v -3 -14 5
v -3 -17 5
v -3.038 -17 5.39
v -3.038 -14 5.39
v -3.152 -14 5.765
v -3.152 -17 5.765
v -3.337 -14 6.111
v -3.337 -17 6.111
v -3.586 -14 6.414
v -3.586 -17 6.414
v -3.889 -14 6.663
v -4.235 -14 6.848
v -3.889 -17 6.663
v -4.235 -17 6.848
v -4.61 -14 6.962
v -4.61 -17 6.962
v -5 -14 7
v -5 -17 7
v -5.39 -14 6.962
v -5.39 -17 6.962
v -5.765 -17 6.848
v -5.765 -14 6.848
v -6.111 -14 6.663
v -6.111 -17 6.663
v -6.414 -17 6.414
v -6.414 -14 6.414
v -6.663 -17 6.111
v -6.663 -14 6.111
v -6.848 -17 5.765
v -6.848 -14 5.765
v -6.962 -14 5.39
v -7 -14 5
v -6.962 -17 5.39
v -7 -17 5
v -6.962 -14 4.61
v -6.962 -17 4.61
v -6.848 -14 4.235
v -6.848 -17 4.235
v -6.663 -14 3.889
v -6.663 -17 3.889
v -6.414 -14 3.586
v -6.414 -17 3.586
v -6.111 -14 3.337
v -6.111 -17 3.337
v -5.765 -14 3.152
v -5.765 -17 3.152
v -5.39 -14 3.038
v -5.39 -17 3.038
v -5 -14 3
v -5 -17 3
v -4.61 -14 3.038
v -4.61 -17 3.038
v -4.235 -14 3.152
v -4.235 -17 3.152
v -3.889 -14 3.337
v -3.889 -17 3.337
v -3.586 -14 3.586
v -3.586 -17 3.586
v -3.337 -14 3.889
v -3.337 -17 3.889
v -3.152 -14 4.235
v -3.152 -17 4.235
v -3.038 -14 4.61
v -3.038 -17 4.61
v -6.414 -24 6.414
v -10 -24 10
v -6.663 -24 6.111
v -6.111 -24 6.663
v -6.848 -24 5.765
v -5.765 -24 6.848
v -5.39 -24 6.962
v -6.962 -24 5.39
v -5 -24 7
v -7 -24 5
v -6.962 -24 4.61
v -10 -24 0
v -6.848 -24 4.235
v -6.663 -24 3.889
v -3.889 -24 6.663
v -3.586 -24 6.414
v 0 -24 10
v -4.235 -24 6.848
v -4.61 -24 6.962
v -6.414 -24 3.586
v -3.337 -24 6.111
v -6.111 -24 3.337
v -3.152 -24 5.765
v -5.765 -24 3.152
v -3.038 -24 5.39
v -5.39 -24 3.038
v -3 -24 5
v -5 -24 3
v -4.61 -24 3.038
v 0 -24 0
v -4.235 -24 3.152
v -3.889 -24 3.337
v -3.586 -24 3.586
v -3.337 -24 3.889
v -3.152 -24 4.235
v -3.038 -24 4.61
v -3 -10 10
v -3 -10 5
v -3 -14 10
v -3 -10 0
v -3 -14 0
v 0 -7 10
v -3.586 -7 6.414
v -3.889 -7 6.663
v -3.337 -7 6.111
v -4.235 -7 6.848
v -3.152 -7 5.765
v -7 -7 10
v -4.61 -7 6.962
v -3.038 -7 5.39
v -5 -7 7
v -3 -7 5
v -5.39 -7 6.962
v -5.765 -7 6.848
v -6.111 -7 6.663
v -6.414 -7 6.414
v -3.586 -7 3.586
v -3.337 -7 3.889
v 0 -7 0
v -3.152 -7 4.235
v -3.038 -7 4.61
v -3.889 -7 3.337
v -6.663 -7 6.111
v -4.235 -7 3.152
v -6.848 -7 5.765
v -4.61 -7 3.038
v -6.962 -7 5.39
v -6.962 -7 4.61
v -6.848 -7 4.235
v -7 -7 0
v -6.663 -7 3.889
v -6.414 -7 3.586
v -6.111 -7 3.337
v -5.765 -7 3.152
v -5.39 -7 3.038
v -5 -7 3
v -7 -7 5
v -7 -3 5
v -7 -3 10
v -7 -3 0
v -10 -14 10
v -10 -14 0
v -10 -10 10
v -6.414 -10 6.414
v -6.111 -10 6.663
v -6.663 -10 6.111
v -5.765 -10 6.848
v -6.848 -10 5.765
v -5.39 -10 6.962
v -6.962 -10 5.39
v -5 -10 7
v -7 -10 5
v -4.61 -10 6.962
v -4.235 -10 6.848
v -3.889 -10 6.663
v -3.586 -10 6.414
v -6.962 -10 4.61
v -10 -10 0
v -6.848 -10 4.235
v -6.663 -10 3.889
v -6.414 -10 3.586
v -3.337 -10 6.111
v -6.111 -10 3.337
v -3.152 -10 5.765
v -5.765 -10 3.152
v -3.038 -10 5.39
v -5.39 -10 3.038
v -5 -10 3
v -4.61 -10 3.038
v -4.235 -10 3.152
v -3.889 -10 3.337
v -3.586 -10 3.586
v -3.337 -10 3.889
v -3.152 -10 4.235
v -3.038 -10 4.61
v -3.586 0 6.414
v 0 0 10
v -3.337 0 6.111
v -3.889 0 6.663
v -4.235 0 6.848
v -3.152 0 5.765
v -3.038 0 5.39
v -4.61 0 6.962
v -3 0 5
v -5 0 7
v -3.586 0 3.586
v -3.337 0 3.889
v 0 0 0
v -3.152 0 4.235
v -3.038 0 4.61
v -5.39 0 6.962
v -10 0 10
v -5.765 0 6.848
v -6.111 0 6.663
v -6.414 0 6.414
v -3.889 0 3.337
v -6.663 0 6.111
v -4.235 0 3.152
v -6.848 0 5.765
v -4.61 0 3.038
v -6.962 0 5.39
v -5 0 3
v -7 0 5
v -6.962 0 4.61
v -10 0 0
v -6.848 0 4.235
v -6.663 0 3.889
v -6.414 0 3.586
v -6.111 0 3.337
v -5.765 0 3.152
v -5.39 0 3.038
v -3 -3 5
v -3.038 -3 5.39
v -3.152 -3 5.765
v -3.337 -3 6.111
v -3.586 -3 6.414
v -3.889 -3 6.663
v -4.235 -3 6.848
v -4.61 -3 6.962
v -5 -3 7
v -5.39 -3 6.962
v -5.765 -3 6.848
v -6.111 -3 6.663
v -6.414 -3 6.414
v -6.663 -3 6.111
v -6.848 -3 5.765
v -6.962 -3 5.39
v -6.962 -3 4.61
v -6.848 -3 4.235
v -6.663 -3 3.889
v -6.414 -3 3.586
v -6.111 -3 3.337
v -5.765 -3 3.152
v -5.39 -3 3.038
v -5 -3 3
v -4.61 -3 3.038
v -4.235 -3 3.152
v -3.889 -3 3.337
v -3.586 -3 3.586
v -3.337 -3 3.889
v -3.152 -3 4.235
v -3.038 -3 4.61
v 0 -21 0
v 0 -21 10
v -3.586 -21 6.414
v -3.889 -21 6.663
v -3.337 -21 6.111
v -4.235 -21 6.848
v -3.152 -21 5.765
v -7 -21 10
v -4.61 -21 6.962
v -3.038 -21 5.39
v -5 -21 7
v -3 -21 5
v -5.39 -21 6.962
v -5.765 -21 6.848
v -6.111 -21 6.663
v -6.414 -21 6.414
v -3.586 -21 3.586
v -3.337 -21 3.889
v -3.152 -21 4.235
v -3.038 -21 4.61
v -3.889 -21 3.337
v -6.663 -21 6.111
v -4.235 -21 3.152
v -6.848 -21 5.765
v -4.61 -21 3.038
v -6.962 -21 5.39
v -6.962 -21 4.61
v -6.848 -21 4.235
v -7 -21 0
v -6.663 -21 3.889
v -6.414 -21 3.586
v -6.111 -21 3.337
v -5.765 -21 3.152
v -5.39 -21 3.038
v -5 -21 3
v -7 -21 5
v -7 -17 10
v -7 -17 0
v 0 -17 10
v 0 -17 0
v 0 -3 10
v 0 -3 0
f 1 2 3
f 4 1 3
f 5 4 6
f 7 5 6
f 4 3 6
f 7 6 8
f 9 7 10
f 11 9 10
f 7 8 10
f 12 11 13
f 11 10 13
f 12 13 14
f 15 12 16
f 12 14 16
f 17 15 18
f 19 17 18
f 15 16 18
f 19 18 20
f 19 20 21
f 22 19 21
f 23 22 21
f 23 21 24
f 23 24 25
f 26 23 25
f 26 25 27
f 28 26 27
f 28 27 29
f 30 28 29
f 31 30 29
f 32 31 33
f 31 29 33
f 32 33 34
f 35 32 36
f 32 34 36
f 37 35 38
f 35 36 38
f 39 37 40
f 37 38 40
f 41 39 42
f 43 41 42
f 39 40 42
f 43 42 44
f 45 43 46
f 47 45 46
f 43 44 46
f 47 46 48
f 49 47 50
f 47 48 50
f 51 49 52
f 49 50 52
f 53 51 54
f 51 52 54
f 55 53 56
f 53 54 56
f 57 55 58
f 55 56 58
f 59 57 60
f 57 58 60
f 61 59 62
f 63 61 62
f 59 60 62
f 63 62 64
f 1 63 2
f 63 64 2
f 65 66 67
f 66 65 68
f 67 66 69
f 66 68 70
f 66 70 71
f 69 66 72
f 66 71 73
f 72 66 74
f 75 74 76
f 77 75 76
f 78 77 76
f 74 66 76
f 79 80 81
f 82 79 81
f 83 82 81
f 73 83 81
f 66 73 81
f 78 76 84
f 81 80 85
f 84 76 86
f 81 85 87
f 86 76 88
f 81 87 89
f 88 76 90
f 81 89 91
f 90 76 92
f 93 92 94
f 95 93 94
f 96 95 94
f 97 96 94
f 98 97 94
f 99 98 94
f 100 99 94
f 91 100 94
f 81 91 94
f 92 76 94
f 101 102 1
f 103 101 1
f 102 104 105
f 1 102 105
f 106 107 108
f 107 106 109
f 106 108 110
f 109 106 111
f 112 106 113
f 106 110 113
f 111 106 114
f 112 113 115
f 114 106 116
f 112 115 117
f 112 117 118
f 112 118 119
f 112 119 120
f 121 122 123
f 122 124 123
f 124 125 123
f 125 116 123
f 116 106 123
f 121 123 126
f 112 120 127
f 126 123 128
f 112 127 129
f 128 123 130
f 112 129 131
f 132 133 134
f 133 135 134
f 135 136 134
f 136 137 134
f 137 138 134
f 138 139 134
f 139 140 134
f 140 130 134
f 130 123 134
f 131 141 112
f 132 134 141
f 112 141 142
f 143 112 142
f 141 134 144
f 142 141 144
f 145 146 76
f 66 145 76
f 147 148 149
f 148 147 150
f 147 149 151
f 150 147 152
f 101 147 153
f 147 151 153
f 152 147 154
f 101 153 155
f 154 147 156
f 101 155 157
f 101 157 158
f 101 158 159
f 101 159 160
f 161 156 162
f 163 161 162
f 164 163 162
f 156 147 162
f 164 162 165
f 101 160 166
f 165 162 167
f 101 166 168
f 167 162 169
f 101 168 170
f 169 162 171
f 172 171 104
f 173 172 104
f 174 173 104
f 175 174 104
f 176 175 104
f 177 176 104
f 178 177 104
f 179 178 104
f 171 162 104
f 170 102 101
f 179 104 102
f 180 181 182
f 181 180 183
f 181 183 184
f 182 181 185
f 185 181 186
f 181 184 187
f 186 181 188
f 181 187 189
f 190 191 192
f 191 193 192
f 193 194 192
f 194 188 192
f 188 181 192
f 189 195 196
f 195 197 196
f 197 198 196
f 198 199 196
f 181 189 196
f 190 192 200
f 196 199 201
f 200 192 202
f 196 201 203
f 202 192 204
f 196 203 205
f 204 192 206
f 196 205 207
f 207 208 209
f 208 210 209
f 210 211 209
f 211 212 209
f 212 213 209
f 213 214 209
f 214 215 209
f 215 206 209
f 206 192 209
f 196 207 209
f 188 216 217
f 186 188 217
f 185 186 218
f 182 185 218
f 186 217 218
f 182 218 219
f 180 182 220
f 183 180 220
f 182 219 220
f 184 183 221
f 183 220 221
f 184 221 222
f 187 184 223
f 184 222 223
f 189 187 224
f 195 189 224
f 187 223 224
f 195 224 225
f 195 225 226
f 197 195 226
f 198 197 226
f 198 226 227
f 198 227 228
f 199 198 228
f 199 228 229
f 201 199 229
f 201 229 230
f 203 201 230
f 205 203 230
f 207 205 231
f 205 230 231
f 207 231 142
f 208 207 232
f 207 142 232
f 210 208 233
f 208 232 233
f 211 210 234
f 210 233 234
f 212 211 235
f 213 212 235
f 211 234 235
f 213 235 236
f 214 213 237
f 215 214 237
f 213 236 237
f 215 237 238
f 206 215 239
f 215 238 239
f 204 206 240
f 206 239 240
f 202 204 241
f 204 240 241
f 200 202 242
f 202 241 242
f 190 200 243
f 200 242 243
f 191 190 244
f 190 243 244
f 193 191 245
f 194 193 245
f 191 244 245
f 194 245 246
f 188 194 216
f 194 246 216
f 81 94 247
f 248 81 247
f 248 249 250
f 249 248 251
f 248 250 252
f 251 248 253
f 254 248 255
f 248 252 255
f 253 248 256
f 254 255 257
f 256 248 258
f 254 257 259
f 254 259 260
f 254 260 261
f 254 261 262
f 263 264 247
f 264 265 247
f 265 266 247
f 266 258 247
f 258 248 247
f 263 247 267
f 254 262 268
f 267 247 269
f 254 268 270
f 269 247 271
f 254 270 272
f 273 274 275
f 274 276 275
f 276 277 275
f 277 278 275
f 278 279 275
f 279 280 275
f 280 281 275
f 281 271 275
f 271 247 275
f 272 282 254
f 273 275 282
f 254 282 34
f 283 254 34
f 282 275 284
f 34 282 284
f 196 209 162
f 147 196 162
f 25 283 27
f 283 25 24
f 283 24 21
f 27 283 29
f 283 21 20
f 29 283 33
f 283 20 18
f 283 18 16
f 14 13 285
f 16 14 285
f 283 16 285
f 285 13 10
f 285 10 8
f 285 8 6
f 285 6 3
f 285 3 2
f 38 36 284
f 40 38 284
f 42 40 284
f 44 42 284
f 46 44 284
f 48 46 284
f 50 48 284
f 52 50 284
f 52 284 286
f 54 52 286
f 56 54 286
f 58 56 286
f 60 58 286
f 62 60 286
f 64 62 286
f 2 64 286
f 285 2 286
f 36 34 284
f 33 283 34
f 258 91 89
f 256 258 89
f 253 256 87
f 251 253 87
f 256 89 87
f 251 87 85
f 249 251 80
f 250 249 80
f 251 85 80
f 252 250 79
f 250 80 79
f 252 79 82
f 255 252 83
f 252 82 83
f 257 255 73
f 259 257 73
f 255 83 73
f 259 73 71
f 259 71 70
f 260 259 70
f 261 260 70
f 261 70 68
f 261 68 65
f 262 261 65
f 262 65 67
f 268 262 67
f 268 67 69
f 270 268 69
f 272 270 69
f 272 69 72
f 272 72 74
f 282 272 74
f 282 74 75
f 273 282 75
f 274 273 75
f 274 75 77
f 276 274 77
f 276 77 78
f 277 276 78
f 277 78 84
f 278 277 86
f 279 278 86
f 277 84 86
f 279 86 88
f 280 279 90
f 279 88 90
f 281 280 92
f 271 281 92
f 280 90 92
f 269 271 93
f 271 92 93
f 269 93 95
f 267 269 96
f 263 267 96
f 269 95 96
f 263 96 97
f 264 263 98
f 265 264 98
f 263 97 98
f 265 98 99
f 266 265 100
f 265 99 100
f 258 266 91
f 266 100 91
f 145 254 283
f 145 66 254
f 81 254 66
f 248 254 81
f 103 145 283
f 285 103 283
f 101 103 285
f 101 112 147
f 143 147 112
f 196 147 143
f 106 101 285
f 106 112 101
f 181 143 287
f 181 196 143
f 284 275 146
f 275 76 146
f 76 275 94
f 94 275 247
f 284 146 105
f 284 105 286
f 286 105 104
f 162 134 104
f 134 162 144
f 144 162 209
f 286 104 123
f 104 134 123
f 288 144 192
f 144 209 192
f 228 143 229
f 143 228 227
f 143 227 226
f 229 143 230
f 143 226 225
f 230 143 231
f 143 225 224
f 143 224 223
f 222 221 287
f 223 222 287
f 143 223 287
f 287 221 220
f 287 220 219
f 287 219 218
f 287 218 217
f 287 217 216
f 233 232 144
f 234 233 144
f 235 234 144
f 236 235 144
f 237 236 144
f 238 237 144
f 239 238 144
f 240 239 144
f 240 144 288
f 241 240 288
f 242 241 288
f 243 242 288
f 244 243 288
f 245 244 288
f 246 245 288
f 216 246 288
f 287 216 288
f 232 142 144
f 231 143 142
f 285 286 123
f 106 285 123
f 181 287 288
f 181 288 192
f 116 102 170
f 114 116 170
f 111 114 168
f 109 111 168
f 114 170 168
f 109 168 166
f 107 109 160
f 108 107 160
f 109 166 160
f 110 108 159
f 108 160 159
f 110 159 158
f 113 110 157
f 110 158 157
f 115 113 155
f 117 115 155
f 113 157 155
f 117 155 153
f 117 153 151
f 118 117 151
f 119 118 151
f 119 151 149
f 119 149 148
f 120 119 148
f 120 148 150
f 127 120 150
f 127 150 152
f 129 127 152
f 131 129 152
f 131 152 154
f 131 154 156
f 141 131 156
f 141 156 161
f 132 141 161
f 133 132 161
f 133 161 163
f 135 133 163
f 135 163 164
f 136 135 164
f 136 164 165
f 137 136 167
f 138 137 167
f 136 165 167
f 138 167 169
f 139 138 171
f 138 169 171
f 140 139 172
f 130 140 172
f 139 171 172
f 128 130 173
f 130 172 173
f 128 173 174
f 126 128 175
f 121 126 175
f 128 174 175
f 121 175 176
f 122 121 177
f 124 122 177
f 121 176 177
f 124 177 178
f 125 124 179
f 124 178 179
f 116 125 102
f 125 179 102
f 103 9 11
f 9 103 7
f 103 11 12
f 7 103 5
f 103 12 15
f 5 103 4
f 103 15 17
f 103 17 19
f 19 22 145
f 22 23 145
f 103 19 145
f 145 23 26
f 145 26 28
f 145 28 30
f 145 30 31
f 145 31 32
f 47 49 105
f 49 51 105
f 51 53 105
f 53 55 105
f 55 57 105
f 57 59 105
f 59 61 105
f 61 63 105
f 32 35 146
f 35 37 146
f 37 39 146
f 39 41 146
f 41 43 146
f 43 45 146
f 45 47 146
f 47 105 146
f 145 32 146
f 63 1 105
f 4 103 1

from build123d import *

# Parameters (mm, degrees)
F1_DEPTH = 10
F3_D     = 4


with BuildPart() as f1:
    # F0 (on Top) → F1 (new body)
    with BuildSketch(Plane.XY):
        Polygon((0, -3), (0, 0), (-10, 0), (-10, -10), (-3, -10), (-3, -14), (-10, -14), (-10, -24), (0, -24), (0, -21), (-7, -21), (-7, -17), (0, -17), (0, -7), (-7, -7), (-7, -3), align=None)
    extrude(amount=F1_DEPTH)

    # F3 (through all)
    with Locations(Plane(origin=(0, 0, 0), x_dir=(-1, 0, 0), z_dir=(0, 1, 0))):
        with Locations((5, 5)):
            Hole(F3_D / 2)


solid = f1.part
